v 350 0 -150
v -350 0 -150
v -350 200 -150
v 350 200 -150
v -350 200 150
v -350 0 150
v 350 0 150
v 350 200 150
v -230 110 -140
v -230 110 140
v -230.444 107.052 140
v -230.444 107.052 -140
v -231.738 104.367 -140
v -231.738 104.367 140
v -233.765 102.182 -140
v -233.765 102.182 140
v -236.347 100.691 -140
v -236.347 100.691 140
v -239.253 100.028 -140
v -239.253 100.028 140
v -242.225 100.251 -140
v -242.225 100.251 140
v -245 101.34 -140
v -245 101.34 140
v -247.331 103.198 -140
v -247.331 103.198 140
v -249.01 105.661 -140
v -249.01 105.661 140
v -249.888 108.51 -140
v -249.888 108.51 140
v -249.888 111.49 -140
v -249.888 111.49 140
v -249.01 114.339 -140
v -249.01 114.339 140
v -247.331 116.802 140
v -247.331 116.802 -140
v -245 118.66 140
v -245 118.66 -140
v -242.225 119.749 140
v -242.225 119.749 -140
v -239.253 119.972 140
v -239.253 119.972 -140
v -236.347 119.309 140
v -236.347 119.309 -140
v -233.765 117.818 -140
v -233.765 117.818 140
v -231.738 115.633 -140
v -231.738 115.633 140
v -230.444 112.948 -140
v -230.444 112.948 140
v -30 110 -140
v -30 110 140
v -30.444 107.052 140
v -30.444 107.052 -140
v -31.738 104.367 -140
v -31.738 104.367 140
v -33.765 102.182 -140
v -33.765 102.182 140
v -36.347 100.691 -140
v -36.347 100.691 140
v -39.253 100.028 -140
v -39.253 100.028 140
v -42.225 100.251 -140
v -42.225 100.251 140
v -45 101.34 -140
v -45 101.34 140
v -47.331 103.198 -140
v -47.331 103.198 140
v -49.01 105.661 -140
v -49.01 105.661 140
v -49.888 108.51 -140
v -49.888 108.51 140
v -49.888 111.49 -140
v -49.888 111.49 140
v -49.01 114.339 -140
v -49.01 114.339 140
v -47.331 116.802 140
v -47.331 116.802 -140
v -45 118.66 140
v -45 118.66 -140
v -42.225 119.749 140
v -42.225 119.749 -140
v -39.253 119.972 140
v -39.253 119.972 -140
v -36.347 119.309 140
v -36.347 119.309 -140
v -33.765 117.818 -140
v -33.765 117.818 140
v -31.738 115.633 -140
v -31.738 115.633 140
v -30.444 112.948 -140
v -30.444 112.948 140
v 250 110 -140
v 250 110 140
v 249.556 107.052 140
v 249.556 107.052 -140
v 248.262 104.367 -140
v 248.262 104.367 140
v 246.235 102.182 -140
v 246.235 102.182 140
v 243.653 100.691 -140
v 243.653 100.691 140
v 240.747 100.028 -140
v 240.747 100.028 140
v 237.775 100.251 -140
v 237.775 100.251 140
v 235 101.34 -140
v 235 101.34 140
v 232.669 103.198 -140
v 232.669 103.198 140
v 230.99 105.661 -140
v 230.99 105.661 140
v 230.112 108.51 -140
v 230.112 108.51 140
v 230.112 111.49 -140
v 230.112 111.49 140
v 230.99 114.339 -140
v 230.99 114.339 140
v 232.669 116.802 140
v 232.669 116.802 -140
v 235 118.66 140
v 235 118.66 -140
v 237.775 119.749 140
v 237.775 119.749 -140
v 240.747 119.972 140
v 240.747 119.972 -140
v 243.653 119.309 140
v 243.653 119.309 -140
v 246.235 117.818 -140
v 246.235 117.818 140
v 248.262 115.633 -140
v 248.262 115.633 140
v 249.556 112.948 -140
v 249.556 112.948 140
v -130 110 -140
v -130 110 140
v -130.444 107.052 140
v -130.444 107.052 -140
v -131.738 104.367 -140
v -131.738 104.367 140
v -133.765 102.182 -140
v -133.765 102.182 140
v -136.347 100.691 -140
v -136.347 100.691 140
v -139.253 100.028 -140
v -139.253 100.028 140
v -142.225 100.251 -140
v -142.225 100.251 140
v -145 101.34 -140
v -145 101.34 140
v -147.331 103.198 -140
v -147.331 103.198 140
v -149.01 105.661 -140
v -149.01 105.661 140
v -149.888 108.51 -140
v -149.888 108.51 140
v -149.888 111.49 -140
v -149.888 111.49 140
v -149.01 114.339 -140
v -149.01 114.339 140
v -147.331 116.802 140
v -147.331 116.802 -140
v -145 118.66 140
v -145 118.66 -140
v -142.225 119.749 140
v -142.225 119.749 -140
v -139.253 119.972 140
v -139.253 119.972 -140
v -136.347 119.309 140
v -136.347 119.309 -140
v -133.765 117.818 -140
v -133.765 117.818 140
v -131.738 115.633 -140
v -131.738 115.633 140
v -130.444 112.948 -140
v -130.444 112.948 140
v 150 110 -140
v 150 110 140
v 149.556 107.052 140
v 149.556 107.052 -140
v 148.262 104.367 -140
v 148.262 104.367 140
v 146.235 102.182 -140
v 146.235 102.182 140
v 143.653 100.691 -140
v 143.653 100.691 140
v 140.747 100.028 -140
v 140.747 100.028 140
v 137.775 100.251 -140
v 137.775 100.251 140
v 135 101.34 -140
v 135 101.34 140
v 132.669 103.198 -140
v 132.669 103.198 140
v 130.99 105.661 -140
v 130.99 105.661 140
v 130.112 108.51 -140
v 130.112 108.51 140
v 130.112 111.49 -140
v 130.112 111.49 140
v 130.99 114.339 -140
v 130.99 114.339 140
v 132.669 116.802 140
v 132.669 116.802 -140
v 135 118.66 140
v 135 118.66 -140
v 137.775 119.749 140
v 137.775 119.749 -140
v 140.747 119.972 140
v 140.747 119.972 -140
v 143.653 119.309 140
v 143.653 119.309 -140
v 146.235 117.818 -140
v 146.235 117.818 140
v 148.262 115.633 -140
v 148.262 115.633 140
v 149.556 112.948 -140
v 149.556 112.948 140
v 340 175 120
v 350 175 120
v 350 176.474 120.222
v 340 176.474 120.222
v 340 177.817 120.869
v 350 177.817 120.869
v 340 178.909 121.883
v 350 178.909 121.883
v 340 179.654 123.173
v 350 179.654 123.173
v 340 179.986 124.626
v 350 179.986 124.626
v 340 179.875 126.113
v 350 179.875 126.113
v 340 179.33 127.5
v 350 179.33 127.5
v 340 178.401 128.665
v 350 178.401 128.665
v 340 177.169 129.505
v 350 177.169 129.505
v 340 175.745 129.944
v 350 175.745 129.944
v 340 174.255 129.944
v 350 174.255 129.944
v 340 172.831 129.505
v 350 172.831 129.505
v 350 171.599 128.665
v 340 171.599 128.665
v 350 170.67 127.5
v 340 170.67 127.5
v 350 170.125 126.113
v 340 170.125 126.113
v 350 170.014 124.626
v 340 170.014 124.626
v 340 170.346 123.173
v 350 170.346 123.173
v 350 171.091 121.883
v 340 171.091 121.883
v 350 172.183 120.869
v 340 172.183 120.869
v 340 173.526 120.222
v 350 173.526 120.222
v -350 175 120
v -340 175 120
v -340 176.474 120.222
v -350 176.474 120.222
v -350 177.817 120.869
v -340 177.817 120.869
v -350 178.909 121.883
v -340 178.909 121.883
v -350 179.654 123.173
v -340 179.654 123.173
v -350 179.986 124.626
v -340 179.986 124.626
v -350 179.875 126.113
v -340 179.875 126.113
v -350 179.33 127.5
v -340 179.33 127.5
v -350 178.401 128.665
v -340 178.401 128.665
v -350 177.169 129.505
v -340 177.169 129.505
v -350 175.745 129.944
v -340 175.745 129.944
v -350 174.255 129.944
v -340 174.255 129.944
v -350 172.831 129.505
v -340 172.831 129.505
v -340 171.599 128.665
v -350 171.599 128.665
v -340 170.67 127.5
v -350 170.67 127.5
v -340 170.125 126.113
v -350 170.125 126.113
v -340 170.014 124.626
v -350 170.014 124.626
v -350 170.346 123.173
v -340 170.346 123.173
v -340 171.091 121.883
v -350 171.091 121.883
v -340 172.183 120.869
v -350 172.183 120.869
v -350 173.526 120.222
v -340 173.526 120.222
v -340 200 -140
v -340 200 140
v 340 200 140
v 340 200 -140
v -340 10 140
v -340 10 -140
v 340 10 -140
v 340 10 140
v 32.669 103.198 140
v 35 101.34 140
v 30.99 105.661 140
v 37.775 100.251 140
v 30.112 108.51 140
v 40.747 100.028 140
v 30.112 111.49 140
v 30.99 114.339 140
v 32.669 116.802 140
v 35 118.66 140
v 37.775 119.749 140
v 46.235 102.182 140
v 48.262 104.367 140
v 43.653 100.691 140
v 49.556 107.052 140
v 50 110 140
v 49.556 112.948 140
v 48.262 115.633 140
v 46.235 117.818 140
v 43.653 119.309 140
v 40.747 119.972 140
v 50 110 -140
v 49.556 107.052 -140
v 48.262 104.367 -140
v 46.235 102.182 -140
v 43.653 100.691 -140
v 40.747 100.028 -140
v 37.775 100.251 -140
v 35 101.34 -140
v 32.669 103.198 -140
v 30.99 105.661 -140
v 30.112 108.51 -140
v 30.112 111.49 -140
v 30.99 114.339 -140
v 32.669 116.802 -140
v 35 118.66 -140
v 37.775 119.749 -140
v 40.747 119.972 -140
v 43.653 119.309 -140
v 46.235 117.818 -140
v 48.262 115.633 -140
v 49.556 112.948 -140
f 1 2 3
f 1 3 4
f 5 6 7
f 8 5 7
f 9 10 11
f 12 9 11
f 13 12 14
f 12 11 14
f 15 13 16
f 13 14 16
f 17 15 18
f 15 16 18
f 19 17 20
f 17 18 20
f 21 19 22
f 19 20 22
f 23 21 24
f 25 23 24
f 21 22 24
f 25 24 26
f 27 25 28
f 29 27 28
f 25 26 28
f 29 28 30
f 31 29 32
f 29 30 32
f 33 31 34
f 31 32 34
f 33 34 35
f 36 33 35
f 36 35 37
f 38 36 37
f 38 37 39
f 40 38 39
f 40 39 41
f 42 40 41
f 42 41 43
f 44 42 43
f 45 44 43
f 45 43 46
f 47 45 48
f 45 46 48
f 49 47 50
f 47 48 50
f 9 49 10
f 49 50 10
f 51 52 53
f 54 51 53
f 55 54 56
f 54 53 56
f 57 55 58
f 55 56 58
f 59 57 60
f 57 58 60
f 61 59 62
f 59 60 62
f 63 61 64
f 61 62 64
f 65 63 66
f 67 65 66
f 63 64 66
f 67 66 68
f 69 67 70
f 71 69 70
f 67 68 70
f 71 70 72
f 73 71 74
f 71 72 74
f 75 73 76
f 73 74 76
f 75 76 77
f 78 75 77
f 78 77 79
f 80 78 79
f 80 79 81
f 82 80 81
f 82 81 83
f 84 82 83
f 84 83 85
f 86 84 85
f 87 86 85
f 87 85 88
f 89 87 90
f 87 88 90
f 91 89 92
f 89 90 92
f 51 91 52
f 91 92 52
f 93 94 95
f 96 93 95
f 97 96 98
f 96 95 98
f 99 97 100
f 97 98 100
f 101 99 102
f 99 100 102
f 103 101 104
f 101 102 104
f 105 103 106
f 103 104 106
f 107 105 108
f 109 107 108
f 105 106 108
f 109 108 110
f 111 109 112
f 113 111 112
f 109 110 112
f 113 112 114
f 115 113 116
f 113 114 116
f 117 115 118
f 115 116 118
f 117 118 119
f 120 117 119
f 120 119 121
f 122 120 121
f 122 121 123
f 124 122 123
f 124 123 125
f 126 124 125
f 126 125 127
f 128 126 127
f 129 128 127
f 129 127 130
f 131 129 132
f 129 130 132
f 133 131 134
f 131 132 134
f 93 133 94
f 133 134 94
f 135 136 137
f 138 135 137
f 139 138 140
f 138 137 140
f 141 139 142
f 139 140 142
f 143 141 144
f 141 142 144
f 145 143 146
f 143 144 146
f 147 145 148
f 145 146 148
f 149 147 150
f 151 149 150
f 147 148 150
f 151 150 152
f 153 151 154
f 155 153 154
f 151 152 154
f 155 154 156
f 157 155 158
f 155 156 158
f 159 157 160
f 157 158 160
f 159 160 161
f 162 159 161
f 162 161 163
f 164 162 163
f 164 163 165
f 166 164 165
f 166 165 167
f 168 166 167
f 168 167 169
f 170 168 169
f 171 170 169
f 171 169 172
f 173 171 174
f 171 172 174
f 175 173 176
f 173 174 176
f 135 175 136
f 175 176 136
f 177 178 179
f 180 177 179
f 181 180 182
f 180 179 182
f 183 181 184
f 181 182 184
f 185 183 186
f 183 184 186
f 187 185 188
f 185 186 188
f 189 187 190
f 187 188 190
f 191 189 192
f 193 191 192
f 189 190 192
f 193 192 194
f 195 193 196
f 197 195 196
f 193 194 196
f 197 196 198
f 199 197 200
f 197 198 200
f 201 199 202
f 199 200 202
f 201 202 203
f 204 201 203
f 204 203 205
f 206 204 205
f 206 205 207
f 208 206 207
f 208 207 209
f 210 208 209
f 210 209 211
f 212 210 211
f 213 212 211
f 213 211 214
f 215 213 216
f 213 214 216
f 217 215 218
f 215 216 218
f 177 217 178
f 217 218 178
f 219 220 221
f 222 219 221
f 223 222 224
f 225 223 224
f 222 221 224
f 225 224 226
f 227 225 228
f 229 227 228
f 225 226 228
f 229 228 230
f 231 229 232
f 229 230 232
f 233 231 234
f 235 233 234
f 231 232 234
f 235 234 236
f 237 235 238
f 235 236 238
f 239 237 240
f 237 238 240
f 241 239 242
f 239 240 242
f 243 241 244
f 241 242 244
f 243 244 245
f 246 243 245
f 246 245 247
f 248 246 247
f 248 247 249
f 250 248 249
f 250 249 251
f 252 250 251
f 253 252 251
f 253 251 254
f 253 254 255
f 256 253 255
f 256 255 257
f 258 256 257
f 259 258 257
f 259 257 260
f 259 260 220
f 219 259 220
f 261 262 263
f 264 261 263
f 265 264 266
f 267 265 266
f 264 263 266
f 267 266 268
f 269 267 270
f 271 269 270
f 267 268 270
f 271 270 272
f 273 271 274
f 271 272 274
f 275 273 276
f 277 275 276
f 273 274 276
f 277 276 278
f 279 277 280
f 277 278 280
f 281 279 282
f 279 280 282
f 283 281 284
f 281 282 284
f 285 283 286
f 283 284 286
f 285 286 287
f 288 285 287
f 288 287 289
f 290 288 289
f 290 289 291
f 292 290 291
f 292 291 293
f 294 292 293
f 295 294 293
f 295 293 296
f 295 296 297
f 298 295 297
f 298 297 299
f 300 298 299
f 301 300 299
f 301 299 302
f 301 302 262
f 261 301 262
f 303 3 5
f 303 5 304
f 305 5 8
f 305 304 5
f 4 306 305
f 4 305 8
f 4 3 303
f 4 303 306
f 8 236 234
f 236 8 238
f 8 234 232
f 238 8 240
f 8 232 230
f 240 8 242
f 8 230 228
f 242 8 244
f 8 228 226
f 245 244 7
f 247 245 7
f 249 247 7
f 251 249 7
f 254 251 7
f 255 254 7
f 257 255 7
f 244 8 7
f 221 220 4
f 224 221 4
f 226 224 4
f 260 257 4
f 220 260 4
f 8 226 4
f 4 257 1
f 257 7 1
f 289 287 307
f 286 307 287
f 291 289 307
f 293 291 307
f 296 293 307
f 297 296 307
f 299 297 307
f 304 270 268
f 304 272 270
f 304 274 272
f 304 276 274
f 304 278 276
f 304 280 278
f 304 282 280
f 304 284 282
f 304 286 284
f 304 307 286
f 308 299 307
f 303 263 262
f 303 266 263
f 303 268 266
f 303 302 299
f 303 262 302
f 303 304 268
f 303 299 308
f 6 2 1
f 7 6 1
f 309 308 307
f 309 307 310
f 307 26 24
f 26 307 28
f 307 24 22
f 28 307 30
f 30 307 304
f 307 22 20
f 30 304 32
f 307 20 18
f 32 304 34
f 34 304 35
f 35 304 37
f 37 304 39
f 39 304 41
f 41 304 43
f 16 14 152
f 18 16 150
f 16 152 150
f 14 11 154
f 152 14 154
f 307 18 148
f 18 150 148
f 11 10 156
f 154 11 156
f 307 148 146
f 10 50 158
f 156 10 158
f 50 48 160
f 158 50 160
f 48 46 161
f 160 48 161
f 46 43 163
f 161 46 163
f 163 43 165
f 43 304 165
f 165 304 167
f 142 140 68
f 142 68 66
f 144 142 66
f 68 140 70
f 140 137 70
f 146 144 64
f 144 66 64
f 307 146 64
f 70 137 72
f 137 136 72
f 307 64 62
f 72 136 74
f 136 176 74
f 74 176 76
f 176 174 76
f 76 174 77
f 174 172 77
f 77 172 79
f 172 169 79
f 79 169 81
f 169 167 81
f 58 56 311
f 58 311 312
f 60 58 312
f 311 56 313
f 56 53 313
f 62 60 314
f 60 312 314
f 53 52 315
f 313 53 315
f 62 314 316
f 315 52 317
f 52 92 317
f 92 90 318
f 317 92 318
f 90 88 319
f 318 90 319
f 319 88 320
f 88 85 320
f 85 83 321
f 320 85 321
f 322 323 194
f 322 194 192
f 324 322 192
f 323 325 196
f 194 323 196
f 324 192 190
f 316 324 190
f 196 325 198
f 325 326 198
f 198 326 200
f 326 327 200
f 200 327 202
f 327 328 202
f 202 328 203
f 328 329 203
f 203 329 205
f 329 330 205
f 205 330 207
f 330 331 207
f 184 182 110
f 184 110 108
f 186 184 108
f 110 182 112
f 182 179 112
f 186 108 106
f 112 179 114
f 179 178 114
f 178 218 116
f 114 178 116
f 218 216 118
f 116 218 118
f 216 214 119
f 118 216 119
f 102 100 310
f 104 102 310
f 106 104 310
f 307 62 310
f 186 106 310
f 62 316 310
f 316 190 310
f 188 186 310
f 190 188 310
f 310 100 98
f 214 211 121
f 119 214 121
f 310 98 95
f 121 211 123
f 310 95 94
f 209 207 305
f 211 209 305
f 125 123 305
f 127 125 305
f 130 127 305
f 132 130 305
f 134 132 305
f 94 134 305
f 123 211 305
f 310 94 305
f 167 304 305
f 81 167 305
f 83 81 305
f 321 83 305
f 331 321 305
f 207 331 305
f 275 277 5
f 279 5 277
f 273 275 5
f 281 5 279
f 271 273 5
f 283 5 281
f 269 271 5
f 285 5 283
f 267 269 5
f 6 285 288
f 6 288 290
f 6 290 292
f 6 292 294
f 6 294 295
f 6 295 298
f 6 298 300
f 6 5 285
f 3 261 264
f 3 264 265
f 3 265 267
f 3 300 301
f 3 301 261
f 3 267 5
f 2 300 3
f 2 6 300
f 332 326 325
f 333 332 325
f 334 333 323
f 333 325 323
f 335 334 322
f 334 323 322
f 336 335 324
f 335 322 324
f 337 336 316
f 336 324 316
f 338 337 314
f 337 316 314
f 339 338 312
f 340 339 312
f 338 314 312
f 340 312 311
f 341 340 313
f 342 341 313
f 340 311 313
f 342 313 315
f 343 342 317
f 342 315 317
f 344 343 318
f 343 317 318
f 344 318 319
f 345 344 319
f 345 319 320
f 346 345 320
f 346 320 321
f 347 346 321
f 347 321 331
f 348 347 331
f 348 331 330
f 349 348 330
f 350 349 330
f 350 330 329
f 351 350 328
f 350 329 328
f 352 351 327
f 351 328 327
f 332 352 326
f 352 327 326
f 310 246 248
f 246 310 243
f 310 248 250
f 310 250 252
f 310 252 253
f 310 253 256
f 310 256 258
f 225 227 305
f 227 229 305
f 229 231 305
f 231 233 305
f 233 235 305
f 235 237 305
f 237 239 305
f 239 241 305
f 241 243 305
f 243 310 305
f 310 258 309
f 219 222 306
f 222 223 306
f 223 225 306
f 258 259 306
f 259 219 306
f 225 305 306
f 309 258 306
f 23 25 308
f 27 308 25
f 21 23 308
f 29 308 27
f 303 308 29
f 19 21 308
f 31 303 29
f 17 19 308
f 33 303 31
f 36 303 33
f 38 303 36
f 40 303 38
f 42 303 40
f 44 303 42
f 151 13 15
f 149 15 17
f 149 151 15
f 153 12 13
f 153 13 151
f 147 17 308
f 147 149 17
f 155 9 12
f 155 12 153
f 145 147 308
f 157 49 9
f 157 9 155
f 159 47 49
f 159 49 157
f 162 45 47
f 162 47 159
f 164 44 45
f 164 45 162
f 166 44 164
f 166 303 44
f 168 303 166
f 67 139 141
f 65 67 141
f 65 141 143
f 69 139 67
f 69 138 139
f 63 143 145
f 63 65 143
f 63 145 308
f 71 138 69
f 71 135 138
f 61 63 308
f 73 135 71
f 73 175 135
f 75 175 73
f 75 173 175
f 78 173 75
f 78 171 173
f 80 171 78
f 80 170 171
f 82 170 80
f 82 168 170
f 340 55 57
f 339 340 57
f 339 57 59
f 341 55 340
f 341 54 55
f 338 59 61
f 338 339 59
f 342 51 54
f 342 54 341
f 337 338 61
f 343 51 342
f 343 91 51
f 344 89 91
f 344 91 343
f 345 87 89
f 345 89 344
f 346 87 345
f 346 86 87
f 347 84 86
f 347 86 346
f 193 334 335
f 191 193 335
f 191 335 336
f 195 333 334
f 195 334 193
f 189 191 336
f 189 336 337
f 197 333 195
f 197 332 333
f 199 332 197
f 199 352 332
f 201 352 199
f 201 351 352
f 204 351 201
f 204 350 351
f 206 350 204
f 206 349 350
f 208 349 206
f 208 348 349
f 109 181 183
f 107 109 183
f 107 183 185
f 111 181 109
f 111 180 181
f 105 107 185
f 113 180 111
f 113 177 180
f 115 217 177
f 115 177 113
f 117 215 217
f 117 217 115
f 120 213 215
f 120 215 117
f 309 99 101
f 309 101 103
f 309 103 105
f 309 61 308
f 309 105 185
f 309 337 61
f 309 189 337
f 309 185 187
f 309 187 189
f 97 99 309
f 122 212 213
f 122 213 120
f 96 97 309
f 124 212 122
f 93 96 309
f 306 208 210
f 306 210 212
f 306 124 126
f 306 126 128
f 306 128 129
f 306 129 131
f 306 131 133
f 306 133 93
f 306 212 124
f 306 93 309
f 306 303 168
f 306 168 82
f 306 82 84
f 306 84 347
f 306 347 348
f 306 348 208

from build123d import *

# Parameters (mm, degrees)
CROQUIS1_W              = 700
CROQUIS1_H              = 300
SALIENTE_EXTRUIR1_DEPTH = 200
CROQUIS2_W              = 680
CROQUIS2_H              = 280
CORTAR_EXTRUIR1_DEPTH   = 190
CROQUIS3_R              = 5
CORTAR_EXTRUIR2_DEPTH   = 700
CROQUIS4_R              = 10
SALIENTE_EXTRUIR2_DEPTH = 280


with BuildPart() as part:
    # Croquis1 → Saliente-Extruir1 (new body)
    with BuildSketch(Plane(origin=(0, 0, 0), x_dir=(1, 0, 0), z_dir=(0, 1, 0))):
        Rectangle(CROQUIS1_W, CROQUIS1_H)
    extrude(amount=SALIENTE_EXTRUIR1_DEPTH)

    # Croquis2 → Cortar-Extruir1 (cut)
    with BuildSketch(Plane(origin=(0, 200, 0), x_dir=(1, 0, 0), z_dir=(0, 1, 0))):
        Rectangle(CROQUIS2_W, CROQUIS2_H)
    extrude(amount=-CORTAR_EXTRUIR1_DEPTH, mode=Mode.SUBTRACT)

    # Croquis3 → Cortar-Extruir2 (cut)
    with BuildSketch(Plane(origin=(350, 0, 0), x_dir=(0, 0, -1), z_dir=(1, 0, 0))):
        with Locations((-125, 175)):
            Circle(CROQUIS3_R)
    extrude(amount=-CORTAR_EXTRUIR2_DEPTH, mode=Mode.SUBTRACT)

    # Croquis4 → Saliente-Extruir2 (add)
    with BuildSketch(Plane(origin=(0, 0, 140), x_dir=(-1, 0, 0), z_dir=(0, 0, -1))):
        with Locations(Location((-240, 110, 0), (0, 0, 180))):
            Circle(CROQUIS4_R)
        with Locations(Location((-140, 110, 0), (0, 0, 180))):
            Circle(CROQUIS4_R)
        with Locations(Location((-40, 110, 0), (0, 0, 180))):
            Circle(CROQUIS4_R)
        with Locations(Location((140, 110, 0), (0, 0, 180))):
            Circle(CROQUIS4_R)
        with Locations(Location((240, 110, 0), (0, 0, 180))):
            Circle(CROQUIS4_R)
        with Locations(Location((40, 110, 0), (0, 0, 180))):
            Circle(CROQUIS4_R)
    extrude(amount=SALIENTE_EXTRUIR2_DEPTH)


solid = part.part
